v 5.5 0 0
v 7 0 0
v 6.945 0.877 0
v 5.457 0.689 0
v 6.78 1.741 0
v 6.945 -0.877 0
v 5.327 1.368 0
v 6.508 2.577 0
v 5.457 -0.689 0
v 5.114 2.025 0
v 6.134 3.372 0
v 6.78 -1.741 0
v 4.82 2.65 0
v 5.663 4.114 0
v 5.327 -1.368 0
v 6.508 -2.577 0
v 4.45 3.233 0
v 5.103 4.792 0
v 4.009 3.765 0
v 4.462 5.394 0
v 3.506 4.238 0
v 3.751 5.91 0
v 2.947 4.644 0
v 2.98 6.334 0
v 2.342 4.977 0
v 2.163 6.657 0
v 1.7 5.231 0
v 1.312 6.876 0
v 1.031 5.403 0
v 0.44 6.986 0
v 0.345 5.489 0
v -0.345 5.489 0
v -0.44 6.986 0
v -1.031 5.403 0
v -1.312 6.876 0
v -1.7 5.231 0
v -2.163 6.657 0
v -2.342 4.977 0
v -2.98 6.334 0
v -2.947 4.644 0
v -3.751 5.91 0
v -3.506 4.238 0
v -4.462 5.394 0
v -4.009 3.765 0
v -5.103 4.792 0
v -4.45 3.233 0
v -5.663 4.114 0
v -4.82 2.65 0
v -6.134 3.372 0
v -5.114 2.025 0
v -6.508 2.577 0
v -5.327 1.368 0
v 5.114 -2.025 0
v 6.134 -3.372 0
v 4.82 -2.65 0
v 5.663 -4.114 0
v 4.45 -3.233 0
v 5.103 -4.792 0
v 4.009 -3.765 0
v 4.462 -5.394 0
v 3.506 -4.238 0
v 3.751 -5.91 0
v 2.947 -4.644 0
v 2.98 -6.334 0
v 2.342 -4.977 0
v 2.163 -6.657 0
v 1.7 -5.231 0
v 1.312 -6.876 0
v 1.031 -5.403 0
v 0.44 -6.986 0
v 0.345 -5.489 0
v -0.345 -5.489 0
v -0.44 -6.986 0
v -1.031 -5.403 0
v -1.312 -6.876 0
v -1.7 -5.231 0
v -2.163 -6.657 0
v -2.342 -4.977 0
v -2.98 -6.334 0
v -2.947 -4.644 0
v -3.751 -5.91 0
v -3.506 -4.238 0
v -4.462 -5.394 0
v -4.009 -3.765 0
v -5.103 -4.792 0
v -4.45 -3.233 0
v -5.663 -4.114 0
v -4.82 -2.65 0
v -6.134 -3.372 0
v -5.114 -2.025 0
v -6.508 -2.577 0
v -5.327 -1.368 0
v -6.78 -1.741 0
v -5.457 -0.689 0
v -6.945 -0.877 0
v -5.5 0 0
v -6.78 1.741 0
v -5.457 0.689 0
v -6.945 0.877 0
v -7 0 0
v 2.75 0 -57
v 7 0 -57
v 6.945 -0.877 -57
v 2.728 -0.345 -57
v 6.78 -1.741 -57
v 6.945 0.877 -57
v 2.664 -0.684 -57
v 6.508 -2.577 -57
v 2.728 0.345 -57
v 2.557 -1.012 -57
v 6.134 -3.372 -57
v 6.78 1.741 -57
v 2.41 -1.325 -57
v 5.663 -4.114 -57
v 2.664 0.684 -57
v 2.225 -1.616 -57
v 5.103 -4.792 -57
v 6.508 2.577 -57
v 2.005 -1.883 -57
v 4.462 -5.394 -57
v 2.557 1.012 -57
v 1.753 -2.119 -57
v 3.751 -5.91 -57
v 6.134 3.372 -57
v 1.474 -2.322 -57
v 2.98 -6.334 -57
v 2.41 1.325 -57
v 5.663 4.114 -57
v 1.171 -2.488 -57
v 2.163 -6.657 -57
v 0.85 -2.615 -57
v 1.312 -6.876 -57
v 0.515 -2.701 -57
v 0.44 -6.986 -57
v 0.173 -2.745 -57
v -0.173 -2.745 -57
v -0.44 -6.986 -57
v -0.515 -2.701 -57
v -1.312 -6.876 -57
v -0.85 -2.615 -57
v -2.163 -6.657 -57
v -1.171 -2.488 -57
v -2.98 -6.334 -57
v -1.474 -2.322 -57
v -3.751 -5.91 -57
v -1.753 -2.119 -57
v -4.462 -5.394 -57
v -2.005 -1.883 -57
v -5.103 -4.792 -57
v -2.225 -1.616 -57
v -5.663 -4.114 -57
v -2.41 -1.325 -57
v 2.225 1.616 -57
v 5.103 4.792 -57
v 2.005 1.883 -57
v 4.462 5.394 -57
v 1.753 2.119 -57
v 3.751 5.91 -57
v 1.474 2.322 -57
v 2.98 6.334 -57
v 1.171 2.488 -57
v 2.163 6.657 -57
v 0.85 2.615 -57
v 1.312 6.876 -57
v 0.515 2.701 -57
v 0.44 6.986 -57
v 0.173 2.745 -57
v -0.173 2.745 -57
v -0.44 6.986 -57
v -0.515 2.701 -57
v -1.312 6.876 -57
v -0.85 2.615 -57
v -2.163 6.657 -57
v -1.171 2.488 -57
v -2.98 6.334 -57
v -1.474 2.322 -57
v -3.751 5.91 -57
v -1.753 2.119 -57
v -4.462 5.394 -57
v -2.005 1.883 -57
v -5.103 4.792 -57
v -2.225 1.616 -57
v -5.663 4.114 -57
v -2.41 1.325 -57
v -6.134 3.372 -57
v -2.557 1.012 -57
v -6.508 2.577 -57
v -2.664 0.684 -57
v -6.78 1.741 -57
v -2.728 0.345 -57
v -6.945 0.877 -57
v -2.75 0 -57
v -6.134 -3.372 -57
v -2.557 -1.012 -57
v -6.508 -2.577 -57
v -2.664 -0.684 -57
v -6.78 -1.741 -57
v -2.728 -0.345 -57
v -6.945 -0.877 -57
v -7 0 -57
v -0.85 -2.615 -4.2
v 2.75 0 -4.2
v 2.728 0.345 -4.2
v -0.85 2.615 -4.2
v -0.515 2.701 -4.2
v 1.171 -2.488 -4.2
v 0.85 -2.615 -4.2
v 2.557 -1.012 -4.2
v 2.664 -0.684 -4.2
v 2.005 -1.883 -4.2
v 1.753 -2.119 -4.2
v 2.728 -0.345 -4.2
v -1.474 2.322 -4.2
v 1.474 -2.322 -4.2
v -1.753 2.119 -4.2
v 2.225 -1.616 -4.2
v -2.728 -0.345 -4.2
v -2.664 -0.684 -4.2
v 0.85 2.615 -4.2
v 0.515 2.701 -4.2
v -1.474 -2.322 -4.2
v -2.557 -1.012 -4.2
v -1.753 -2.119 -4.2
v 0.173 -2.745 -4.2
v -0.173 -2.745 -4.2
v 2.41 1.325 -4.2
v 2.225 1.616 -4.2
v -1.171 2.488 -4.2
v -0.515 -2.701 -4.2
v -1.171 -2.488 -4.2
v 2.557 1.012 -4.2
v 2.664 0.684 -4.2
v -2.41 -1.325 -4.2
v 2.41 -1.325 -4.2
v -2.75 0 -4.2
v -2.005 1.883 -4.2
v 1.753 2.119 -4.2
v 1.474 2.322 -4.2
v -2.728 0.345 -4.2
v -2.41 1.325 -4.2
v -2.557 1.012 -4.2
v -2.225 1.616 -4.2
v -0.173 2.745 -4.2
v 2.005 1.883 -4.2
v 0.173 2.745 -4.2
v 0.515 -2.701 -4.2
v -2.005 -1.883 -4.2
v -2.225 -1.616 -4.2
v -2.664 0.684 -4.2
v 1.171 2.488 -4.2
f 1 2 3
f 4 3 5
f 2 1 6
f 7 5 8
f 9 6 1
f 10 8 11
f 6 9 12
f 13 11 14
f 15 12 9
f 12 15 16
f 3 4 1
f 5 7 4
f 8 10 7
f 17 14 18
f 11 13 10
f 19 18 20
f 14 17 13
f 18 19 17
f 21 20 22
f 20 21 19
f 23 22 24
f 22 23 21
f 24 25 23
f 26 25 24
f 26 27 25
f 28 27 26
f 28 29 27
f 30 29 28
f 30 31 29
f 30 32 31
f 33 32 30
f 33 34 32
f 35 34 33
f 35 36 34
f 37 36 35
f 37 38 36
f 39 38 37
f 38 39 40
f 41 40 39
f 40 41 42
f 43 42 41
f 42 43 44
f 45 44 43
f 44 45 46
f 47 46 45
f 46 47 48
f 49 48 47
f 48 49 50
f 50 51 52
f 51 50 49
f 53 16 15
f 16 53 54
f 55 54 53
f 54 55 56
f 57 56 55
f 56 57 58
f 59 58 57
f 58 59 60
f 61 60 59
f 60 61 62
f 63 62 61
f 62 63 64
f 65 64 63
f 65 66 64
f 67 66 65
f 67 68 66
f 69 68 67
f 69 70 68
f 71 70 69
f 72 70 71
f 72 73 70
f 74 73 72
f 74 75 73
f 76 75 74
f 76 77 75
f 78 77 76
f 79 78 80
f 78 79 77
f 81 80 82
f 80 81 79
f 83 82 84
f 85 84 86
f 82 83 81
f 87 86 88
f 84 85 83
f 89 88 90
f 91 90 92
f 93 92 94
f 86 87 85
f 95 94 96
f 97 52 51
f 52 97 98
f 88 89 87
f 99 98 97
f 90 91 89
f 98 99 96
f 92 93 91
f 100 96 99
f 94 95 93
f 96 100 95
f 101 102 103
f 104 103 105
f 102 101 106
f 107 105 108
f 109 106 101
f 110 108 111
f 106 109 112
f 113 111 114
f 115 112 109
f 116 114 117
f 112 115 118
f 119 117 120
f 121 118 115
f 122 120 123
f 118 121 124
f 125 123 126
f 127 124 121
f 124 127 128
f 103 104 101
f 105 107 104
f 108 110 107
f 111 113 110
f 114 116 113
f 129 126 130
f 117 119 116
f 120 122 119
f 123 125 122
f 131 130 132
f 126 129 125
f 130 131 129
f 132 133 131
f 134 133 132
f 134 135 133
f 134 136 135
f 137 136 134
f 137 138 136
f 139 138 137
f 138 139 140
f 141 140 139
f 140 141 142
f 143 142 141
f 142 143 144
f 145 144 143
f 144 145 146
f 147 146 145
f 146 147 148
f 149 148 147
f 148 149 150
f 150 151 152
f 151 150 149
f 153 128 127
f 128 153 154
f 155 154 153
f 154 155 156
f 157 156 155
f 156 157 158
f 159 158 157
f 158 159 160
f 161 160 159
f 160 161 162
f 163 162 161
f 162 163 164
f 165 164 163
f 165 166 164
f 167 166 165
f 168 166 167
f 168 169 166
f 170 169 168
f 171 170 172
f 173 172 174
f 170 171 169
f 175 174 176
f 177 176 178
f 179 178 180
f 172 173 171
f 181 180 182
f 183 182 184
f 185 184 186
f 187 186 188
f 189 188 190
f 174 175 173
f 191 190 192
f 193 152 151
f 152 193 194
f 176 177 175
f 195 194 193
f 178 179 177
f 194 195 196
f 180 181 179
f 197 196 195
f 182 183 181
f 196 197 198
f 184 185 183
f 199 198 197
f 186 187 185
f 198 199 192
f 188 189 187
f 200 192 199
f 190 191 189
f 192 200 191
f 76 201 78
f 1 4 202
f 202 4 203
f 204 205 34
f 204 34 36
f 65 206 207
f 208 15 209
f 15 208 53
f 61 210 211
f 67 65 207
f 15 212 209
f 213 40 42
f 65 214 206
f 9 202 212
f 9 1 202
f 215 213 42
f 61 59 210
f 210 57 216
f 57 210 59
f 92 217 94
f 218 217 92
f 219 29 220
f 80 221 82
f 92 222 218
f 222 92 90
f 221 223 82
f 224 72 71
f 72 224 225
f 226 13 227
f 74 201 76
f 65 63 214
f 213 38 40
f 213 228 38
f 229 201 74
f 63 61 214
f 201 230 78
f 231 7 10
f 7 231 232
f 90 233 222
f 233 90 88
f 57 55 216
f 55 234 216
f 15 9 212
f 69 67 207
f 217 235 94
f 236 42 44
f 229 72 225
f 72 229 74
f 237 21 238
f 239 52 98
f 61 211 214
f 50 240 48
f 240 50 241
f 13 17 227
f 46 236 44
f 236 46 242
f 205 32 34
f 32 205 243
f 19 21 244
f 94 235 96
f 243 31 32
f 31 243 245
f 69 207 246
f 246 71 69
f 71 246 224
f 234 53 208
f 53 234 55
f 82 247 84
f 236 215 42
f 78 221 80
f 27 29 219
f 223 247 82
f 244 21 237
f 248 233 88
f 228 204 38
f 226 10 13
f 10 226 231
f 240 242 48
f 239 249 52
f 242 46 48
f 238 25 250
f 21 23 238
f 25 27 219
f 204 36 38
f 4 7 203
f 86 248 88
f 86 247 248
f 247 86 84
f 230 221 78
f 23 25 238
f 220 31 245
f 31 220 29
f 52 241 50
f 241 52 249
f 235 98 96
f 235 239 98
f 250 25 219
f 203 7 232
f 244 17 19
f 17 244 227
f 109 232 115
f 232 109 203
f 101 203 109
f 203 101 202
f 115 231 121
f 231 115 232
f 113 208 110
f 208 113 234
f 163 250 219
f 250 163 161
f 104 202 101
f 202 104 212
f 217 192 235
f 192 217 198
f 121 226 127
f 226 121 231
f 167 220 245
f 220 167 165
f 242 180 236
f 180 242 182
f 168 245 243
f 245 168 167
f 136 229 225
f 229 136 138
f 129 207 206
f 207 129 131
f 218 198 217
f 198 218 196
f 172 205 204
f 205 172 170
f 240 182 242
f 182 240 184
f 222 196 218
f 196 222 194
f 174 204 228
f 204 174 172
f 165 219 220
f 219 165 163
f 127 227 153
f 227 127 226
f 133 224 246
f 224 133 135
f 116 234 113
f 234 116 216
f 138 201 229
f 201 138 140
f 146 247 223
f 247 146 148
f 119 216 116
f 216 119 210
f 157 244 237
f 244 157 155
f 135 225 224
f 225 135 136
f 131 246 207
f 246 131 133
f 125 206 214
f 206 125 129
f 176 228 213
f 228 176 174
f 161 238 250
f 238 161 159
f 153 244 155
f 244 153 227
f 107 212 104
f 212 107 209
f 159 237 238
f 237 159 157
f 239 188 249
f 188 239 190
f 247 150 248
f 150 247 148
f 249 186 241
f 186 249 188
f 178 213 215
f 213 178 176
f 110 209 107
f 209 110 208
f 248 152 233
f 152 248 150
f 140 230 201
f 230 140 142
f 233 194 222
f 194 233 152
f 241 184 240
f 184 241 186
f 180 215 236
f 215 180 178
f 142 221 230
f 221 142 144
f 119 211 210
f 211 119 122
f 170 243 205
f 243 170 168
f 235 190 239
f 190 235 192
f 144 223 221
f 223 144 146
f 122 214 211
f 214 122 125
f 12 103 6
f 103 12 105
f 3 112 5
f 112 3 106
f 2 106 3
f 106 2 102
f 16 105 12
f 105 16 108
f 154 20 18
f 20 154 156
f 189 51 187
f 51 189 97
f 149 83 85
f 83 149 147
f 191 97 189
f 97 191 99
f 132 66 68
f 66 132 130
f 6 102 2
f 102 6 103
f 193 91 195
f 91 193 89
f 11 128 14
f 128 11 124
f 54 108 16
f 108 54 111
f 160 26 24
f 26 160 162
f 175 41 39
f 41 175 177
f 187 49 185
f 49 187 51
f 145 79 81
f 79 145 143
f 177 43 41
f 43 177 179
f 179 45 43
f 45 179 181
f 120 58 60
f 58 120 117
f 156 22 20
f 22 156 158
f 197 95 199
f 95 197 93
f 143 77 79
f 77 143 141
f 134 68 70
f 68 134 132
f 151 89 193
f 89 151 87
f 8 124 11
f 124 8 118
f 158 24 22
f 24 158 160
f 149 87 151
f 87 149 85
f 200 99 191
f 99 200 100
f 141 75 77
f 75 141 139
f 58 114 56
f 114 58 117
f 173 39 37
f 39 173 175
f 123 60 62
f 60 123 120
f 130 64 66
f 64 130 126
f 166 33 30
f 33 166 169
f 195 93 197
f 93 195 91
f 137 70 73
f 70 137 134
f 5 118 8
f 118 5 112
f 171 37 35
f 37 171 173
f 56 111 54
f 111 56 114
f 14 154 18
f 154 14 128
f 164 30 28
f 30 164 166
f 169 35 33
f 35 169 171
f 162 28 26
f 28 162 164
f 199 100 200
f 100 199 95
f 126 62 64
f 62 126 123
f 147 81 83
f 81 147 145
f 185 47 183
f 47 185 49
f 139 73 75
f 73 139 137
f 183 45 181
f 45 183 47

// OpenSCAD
$fn = 50;


difference() {
	union() {
		translate(v = [0, 0, -57.0000000000]) {
			cylinder(h = 57, r = 7.0000000000);
		}
		cylinder(h = 0, r = 10.0000000000);
	}
	union() {
		translate(v = [0, 0, 0]) {
			rotate(a = [0, 0, 0]) {
				difference() {
					union() {
						#translate(v = [0, 0, -57.0000000000]) {
							cylinder(h = 57, r = 2.2500000000);
						}
						#translate(v = [0, 0, -4.2000000000]) {
							cylinder(h = 4.2000000000, r = 7.0000000000, r1 = 2.7500000000, r2 = 5.5000000000);
						}
						#translate(v = [0, 0, -57.0000000000]) {
							cylinder(h = 57, r = 2.7500000000);
						}
						#translate(v = [0, 0, -57.0000000000]) {
							cylinder(h = 57, r = 2.2500000000);
						}
					}
					union();
				}
			}
		}
	}
}
